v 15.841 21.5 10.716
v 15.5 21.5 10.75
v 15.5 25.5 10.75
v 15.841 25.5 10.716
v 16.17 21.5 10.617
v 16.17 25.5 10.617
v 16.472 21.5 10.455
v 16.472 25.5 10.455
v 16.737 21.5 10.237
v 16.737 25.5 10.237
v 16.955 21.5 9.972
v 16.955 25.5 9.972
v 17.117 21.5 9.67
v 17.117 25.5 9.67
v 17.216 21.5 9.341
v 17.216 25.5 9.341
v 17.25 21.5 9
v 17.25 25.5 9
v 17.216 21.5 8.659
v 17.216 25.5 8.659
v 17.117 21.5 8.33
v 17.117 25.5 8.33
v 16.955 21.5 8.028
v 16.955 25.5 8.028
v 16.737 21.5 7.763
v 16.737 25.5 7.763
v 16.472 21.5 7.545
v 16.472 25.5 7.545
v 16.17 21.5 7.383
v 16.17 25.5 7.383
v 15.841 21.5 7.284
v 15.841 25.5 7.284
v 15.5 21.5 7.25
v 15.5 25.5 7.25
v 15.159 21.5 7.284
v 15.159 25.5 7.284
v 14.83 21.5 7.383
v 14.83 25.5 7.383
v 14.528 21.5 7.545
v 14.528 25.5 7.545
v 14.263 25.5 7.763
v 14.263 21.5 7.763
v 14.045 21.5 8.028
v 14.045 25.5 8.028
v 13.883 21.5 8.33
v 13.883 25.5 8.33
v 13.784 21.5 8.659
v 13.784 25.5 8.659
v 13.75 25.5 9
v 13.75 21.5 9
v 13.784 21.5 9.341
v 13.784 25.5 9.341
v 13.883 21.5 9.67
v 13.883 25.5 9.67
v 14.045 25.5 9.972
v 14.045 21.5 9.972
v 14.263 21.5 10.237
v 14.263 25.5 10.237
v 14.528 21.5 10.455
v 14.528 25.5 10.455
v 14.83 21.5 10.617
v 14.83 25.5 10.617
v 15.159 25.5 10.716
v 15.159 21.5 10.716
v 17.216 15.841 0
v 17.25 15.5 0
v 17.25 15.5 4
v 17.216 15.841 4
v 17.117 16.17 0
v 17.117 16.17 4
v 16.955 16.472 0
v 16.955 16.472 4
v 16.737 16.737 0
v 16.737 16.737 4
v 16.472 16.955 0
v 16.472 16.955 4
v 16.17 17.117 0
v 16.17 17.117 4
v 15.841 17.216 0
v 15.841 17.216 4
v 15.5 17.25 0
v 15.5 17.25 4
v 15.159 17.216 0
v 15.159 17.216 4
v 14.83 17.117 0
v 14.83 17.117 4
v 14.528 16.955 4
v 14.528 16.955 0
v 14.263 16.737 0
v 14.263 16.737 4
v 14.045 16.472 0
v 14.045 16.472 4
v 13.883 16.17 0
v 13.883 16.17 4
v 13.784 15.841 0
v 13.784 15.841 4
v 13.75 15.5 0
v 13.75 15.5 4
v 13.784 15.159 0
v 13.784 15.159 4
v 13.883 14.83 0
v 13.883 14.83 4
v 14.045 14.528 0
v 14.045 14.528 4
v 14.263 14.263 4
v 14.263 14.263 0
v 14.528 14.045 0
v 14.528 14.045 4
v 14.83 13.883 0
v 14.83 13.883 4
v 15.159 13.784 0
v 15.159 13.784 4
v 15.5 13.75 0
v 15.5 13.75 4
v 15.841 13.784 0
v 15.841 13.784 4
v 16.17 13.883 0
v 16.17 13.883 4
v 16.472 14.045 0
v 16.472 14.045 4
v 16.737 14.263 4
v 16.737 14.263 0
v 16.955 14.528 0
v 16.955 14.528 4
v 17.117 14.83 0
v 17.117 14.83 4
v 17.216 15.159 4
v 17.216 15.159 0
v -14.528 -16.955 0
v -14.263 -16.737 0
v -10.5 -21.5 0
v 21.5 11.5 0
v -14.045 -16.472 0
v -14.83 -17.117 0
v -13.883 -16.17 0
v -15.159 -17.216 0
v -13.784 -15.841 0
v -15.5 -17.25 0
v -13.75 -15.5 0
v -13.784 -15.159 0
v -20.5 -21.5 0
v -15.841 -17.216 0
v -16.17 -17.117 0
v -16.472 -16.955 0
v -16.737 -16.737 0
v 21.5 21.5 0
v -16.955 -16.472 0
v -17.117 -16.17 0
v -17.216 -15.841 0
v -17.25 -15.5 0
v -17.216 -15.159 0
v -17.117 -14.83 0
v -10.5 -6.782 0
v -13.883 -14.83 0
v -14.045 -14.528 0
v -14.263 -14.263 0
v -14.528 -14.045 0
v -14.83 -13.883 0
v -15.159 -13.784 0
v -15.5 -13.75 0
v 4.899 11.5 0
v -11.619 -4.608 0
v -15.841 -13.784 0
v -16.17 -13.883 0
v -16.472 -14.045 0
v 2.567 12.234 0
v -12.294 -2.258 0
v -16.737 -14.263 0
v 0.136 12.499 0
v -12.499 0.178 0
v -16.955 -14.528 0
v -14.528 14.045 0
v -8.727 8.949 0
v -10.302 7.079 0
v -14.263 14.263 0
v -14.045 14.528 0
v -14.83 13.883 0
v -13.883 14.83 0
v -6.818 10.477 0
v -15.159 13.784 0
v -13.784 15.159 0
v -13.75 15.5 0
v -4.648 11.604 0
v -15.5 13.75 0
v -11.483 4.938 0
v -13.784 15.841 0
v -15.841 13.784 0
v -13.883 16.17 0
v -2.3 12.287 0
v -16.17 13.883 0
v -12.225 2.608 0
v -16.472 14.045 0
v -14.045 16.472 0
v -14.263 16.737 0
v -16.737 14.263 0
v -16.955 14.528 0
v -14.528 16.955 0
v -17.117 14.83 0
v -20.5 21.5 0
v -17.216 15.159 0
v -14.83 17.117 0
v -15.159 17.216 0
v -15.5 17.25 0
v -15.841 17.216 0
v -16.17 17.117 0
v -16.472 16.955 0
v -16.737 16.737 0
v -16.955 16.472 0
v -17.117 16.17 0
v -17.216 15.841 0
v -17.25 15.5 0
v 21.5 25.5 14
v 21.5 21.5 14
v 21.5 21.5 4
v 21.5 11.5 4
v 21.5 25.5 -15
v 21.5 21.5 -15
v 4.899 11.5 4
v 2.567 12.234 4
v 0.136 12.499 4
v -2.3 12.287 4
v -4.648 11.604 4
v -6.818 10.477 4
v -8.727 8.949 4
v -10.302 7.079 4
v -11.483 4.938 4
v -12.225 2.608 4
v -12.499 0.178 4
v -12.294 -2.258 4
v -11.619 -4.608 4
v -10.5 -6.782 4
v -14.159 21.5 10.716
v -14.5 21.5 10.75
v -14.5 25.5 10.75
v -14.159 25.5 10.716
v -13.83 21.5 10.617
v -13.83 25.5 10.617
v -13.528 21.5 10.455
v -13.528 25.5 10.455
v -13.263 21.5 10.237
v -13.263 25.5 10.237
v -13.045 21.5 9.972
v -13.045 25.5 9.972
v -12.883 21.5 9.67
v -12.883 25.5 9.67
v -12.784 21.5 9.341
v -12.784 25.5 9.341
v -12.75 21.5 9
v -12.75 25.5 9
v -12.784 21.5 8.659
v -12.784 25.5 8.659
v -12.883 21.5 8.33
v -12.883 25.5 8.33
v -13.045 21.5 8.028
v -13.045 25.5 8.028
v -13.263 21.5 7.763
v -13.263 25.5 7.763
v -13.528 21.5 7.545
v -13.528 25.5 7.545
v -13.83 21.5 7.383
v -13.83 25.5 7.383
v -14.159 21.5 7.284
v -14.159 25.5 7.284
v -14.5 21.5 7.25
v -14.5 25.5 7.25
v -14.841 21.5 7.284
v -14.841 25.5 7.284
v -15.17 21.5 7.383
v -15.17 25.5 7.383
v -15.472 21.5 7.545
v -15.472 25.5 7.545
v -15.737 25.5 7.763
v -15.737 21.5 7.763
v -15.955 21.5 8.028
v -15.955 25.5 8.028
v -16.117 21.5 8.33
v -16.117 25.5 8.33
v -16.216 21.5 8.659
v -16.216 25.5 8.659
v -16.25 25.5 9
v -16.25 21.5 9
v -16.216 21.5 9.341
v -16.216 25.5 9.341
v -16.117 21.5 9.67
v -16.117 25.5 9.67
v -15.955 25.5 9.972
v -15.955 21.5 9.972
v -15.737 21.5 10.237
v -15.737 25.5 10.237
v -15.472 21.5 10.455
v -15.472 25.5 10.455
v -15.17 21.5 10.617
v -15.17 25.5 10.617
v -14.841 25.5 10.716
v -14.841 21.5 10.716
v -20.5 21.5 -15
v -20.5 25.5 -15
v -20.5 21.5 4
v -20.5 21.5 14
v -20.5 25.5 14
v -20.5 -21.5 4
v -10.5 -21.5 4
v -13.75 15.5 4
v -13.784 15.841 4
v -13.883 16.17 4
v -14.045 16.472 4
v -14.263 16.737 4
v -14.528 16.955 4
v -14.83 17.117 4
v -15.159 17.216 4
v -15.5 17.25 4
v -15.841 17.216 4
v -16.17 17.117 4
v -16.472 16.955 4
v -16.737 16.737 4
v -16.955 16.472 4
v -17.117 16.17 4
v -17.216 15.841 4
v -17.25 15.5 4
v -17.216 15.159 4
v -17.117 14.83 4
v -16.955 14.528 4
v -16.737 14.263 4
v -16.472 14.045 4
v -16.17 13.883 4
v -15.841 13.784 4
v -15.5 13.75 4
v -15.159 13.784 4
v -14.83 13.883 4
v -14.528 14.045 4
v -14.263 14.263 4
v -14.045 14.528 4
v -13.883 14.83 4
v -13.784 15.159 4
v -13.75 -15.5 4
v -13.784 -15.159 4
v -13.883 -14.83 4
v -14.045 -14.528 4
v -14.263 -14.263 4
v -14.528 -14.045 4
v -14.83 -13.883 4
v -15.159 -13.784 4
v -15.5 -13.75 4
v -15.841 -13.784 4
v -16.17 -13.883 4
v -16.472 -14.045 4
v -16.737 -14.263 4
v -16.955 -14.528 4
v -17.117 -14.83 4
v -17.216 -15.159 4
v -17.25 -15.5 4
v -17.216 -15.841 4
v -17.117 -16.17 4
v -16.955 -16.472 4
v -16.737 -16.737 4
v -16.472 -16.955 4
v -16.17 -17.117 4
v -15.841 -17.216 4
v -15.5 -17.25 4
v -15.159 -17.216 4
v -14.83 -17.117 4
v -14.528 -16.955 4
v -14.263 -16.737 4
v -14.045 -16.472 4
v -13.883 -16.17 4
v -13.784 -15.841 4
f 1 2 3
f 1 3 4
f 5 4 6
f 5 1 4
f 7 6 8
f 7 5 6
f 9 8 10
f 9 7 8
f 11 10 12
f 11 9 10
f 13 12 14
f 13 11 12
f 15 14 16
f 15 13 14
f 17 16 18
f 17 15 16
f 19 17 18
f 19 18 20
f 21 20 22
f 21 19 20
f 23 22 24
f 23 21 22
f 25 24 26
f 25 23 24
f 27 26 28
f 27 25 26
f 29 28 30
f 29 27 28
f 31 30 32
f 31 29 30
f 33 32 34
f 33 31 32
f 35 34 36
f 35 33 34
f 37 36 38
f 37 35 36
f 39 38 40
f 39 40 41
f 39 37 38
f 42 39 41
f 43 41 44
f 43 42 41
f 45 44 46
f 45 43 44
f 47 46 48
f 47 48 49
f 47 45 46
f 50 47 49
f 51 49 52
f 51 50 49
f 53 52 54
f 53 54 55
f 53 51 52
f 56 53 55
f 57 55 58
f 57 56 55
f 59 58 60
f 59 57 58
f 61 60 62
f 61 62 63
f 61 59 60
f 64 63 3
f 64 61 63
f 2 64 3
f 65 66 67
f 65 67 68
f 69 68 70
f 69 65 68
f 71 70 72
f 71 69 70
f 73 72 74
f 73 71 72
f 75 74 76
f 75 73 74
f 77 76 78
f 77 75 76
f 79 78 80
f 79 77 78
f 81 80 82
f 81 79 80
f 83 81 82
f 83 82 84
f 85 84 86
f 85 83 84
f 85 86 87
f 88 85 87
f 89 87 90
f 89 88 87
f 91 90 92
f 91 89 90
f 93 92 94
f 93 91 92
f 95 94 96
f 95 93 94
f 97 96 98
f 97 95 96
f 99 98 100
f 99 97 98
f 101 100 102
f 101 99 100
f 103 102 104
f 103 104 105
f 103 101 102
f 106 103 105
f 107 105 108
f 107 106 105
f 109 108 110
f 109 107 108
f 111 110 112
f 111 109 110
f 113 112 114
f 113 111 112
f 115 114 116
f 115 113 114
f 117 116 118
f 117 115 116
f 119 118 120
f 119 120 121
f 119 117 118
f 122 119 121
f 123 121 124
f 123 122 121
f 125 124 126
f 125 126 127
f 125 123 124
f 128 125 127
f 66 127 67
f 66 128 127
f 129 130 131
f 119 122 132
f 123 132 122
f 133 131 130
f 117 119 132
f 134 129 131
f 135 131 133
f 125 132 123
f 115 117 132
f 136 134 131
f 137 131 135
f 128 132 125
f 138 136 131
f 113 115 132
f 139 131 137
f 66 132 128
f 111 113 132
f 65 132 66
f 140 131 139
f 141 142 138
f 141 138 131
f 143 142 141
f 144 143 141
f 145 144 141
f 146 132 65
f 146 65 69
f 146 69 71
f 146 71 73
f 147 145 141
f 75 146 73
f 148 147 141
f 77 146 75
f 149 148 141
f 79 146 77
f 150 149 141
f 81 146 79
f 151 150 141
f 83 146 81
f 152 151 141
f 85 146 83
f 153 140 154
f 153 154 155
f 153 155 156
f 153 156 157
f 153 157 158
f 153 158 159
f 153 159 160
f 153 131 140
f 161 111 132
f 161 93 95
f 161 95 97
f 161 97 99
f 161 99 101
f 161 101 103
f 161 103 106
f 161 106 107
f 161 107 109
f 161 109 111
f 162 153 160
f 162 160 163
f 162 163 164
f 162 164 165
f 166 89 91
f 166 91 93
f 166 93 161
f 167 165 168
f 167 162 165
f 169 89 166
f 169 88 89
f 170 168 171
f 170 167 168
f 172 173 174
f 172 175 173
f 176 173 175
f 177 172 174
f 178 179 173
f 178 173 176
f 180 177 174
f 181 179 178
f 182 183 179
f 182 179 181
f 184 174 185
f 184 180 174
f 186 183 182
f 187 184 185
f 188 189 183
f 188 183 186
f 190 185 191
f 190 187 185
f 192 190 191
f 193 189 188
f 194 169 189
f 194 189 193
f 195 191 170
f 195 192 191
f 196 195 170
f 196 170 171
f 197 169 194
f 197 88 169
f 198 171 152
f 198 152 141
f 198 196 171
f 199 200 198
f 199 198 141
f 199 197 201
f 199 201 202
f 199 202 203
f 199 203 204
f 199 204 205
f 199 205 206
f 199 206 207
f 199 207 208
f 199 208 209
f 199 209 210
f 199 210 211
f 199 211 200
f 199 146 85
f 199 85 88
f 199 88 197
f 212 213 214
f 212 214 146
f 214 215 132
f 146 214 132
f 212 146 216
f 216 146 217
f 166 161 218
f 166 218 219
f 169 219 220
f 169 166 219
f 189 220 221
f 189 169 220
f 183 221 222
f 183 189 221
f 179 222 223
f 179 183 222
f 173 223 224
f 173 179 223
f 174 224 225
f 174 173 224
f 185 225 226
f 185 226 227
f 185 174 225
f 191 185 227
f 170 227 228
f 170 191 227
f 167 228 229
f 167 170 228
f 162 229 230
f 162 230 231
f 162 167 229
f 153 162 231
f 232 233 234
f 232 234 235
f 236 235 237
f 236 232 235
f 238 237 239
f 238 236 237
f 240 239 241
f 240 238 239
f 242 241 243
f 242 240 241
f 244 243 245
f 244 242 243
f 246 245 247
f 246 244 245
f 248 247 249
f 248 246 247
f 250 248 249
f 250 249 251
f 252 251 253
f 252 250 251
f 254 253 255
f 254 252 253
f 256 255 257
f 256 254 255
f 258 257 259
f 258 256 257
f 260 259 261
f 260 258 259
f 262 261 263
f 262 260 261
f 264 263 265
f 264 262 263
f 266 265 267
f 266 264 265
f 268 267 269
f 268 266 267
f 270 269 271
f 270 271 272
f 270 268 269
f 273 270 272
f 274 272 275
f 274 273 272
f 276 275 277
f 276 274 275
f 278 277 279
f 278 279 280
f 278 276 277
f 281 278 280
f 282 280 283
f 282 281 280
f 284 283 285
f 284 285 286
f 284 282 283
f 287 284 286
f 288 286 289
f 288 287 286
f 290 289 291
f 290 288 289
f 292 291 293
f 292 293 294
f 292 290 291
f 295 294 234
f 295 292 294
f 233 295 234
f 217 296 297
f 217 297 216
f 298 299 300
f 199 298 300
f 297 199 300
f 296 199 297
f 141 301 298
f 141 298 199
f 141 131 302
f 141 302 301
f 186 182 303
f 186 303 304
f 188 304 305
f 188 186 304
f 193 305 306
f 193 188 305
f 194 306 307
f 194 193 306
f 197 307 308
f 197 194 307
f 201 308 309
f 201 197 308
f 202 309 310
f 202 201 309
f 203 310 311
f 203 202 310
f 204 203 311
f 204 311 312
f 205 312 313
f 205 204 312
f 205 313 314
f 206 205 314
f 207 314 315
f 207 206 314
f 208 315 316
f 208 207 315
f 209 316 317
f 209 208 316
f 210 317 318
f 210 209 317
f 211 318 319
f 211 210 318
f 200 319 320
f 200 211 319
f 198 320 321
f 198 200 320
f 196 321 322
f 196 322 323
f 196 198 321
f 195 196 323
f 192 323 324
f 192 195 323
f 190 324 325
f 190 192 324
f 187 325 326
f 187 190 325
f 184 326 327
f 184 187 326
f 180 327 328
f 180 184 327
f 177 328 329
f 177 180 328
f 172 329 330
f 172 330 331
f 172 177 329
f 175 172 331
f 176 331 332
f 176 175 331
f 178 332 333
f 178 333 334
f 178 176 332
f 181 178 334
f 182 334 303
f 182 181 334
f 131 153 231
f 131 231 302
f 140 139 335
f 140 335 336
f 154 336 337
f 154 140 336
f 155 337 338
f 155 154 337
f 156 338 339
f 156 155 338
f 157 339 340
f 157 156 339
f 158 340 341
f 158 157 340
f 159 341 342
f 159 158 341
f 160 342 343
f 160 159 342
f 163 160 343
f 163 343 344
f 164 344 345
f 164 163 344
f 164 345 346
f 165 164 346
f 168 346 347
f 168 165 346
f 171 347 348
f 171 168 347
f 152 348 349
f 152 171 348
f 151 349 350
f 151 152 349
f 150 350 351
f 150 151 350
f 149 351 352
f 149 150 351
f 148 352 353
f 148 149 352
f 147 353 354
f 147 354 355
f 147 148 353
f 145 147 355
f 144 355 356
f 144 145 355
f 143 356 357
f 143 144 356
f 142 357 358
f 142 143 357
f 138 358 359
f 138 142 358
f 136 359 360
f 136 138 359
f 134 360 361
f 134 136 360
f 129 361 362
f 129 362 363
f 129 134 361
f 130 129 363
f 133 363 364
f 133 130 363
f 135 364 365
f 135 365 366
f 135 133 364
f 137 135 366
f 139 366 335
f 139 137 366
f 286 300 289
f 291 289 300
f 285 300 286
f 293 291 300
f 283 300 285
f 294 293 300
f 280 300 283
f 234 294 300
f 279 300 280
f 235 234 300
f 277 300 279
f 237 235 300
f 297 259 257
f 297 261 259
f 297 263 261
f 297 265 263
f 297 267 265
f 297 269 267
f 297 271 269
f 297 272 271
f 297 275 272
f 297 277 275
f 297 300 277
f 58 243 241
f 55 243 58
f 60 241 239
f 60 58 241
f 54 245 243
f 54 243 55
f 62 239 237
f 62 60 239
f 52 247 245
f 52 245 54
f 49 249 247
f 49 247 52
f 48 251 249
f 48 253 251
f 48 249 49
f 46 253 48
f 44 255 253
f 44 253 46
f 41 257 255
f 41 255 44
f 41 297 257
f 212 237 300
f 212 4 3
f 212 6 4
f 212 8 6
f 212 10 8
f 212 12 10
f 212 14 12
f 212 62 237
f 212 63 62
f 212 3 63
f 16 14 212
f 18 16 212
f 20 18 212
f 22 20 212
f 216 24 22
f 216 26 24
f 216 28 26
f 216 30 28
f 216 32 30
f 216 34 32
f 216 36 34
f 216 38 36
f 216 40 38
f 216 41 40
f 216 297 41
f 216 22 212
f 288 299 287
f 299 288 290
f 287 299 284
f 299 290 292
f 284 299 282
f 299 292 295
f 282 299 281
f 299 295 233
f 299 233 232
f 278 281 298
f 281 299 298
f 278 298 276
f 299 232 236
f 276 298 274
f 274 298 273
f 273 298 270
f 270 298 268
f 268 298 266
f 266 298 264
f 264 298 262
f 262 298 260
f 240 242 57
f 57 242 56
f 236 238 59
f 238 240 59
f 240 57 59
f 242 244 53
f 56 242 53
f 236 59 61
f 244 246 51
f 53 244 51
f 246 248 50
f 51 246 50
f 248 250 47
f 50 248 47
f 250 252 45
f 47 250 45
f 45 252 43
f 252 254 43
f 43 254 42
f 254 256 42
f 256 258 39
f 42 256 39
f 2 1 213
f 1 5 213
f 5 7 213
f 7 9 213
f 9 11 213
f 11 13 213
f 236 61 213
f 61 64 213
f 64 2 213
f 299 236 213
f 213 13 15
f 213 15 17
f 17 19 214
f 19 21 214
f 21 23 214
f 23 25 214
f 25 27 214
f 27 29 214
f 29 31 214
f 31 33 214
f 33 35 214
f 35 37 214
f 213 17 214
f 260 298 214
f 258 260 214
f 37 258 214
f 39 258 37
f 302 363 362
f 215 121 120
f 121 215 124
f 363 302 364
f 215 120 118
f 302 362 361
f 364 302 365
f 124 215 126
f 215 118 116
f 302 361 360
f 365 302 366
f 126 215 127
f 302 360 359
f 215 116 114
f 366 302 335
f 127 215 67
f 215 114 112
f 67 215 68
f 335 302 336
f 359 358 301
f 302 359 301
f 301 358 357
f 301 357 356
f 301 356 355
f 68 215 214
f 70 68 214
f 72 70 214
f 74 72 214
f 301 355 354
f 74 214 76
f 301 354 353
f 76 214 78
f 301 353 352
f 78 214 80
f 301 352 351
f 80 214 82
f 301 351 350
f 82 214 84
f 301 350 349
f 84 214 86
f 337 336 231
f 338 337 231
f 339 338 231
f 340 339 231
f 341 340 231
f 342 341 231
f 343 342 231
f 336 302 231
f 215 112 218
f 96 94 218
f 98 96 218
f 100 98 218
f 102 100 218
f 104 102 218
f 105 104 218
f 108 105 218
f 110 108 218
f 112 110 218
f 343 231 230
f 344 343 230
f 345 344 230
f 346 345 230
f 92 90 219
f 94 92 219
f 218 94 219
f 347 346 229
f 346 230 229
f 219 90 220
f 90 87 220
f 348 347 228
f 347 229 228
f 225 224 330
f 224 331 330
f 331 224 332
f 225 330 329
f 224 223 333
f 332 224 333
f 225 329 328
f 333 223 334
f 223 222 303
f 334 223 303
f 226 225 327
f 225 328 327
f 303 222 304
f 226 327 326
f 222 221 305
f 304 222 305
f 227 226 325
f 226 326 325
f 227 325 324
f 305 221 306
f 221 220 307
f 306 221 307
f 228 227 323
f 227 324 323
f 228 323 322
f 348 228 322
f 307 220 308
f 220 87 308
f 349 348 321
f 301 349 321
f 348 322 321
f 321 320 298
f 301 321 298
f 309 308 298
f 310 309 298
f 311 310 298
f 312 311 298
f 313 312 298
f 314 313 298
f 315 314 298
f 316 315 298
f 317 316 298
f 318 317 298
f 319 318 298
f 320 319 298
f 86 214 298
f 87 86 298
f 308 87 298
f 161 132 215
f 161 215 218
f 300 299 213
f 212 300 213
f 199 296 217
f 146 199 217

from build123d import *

# Parameters (mm, degrees)
ESBO_O1_R                = 1.75
RESSALTO_EXTRUS_O1_DEPTH = 4
ESBO_O2_W                = 42
ESBO_O2_H                = 29
ESBO_O2_R                = 1.75
RESSALTO_EXTRUS_O2_DEPTH = 4


with BuildPart() as part:
    # Esboço1 → Ressalto-extrusão1 (new body)
    with BuildSketch(Plane.XY):
        with BuildLine():
            Line((-20.5, -21.5), (-20.5, 21.5))
            Line((-20.5, 21.5), (21.5, 21.5))
            Line((21.5, 21.5), (21.5, 11.5))
            Line((21.5, 11.5), (4.898979486, 11.5))
            ThreePointArc((4.898979486, 11.5), (-9.56053111, 8.052716616), (-10.5, -6.782329983))
            Line((-10.5, -6.782329983), (-10.5, -21.5))
            Line((-10.5, -21.5), (-20.5, -21.5))
        make_face()
        with Locations((-15.5, 15.5)):
            Circle(ESBO_O1_R, mode=Mode.SUBTRACT)
        with Locations((15.5, 15.5)):
            Circle(ESBO_O1_R, mode=Mode.SUBTRACT)
        with Locations((-15.5, -15.5)):
            Circle(ESBO_O1_R, mode=Mode.SUBTRACT)
    extrude(amount=RESSALTO_EXTRUS_O1_DEPTH)

    # Esboço2 → Ressalto-extrusão2 (add)
    with BuildSketch(Plane(origin=(0, 21.5, 0), x_dir=(1, 0, 0), z_dir=(0, 1, 0))):
        with Locations((0.5, 0.5)):
            Rectangle(ESBO_O2_W, ESBO_O2_H)
        with Locations(Location((-14.5, -9, 0), (0, 0, 270))):
            Circle(ESBO_O2_R, mode=Mode.SUBTRACT)
        with Locations(Location((15.5, -9, 0), (0, 0, 270))):
            Circle(ESBO_O2_R, mode=Mode.SUBTRACT)
    extrude(amount=RESSALTO_EXTRUS_O2_DEPTH)


solid = part.part
